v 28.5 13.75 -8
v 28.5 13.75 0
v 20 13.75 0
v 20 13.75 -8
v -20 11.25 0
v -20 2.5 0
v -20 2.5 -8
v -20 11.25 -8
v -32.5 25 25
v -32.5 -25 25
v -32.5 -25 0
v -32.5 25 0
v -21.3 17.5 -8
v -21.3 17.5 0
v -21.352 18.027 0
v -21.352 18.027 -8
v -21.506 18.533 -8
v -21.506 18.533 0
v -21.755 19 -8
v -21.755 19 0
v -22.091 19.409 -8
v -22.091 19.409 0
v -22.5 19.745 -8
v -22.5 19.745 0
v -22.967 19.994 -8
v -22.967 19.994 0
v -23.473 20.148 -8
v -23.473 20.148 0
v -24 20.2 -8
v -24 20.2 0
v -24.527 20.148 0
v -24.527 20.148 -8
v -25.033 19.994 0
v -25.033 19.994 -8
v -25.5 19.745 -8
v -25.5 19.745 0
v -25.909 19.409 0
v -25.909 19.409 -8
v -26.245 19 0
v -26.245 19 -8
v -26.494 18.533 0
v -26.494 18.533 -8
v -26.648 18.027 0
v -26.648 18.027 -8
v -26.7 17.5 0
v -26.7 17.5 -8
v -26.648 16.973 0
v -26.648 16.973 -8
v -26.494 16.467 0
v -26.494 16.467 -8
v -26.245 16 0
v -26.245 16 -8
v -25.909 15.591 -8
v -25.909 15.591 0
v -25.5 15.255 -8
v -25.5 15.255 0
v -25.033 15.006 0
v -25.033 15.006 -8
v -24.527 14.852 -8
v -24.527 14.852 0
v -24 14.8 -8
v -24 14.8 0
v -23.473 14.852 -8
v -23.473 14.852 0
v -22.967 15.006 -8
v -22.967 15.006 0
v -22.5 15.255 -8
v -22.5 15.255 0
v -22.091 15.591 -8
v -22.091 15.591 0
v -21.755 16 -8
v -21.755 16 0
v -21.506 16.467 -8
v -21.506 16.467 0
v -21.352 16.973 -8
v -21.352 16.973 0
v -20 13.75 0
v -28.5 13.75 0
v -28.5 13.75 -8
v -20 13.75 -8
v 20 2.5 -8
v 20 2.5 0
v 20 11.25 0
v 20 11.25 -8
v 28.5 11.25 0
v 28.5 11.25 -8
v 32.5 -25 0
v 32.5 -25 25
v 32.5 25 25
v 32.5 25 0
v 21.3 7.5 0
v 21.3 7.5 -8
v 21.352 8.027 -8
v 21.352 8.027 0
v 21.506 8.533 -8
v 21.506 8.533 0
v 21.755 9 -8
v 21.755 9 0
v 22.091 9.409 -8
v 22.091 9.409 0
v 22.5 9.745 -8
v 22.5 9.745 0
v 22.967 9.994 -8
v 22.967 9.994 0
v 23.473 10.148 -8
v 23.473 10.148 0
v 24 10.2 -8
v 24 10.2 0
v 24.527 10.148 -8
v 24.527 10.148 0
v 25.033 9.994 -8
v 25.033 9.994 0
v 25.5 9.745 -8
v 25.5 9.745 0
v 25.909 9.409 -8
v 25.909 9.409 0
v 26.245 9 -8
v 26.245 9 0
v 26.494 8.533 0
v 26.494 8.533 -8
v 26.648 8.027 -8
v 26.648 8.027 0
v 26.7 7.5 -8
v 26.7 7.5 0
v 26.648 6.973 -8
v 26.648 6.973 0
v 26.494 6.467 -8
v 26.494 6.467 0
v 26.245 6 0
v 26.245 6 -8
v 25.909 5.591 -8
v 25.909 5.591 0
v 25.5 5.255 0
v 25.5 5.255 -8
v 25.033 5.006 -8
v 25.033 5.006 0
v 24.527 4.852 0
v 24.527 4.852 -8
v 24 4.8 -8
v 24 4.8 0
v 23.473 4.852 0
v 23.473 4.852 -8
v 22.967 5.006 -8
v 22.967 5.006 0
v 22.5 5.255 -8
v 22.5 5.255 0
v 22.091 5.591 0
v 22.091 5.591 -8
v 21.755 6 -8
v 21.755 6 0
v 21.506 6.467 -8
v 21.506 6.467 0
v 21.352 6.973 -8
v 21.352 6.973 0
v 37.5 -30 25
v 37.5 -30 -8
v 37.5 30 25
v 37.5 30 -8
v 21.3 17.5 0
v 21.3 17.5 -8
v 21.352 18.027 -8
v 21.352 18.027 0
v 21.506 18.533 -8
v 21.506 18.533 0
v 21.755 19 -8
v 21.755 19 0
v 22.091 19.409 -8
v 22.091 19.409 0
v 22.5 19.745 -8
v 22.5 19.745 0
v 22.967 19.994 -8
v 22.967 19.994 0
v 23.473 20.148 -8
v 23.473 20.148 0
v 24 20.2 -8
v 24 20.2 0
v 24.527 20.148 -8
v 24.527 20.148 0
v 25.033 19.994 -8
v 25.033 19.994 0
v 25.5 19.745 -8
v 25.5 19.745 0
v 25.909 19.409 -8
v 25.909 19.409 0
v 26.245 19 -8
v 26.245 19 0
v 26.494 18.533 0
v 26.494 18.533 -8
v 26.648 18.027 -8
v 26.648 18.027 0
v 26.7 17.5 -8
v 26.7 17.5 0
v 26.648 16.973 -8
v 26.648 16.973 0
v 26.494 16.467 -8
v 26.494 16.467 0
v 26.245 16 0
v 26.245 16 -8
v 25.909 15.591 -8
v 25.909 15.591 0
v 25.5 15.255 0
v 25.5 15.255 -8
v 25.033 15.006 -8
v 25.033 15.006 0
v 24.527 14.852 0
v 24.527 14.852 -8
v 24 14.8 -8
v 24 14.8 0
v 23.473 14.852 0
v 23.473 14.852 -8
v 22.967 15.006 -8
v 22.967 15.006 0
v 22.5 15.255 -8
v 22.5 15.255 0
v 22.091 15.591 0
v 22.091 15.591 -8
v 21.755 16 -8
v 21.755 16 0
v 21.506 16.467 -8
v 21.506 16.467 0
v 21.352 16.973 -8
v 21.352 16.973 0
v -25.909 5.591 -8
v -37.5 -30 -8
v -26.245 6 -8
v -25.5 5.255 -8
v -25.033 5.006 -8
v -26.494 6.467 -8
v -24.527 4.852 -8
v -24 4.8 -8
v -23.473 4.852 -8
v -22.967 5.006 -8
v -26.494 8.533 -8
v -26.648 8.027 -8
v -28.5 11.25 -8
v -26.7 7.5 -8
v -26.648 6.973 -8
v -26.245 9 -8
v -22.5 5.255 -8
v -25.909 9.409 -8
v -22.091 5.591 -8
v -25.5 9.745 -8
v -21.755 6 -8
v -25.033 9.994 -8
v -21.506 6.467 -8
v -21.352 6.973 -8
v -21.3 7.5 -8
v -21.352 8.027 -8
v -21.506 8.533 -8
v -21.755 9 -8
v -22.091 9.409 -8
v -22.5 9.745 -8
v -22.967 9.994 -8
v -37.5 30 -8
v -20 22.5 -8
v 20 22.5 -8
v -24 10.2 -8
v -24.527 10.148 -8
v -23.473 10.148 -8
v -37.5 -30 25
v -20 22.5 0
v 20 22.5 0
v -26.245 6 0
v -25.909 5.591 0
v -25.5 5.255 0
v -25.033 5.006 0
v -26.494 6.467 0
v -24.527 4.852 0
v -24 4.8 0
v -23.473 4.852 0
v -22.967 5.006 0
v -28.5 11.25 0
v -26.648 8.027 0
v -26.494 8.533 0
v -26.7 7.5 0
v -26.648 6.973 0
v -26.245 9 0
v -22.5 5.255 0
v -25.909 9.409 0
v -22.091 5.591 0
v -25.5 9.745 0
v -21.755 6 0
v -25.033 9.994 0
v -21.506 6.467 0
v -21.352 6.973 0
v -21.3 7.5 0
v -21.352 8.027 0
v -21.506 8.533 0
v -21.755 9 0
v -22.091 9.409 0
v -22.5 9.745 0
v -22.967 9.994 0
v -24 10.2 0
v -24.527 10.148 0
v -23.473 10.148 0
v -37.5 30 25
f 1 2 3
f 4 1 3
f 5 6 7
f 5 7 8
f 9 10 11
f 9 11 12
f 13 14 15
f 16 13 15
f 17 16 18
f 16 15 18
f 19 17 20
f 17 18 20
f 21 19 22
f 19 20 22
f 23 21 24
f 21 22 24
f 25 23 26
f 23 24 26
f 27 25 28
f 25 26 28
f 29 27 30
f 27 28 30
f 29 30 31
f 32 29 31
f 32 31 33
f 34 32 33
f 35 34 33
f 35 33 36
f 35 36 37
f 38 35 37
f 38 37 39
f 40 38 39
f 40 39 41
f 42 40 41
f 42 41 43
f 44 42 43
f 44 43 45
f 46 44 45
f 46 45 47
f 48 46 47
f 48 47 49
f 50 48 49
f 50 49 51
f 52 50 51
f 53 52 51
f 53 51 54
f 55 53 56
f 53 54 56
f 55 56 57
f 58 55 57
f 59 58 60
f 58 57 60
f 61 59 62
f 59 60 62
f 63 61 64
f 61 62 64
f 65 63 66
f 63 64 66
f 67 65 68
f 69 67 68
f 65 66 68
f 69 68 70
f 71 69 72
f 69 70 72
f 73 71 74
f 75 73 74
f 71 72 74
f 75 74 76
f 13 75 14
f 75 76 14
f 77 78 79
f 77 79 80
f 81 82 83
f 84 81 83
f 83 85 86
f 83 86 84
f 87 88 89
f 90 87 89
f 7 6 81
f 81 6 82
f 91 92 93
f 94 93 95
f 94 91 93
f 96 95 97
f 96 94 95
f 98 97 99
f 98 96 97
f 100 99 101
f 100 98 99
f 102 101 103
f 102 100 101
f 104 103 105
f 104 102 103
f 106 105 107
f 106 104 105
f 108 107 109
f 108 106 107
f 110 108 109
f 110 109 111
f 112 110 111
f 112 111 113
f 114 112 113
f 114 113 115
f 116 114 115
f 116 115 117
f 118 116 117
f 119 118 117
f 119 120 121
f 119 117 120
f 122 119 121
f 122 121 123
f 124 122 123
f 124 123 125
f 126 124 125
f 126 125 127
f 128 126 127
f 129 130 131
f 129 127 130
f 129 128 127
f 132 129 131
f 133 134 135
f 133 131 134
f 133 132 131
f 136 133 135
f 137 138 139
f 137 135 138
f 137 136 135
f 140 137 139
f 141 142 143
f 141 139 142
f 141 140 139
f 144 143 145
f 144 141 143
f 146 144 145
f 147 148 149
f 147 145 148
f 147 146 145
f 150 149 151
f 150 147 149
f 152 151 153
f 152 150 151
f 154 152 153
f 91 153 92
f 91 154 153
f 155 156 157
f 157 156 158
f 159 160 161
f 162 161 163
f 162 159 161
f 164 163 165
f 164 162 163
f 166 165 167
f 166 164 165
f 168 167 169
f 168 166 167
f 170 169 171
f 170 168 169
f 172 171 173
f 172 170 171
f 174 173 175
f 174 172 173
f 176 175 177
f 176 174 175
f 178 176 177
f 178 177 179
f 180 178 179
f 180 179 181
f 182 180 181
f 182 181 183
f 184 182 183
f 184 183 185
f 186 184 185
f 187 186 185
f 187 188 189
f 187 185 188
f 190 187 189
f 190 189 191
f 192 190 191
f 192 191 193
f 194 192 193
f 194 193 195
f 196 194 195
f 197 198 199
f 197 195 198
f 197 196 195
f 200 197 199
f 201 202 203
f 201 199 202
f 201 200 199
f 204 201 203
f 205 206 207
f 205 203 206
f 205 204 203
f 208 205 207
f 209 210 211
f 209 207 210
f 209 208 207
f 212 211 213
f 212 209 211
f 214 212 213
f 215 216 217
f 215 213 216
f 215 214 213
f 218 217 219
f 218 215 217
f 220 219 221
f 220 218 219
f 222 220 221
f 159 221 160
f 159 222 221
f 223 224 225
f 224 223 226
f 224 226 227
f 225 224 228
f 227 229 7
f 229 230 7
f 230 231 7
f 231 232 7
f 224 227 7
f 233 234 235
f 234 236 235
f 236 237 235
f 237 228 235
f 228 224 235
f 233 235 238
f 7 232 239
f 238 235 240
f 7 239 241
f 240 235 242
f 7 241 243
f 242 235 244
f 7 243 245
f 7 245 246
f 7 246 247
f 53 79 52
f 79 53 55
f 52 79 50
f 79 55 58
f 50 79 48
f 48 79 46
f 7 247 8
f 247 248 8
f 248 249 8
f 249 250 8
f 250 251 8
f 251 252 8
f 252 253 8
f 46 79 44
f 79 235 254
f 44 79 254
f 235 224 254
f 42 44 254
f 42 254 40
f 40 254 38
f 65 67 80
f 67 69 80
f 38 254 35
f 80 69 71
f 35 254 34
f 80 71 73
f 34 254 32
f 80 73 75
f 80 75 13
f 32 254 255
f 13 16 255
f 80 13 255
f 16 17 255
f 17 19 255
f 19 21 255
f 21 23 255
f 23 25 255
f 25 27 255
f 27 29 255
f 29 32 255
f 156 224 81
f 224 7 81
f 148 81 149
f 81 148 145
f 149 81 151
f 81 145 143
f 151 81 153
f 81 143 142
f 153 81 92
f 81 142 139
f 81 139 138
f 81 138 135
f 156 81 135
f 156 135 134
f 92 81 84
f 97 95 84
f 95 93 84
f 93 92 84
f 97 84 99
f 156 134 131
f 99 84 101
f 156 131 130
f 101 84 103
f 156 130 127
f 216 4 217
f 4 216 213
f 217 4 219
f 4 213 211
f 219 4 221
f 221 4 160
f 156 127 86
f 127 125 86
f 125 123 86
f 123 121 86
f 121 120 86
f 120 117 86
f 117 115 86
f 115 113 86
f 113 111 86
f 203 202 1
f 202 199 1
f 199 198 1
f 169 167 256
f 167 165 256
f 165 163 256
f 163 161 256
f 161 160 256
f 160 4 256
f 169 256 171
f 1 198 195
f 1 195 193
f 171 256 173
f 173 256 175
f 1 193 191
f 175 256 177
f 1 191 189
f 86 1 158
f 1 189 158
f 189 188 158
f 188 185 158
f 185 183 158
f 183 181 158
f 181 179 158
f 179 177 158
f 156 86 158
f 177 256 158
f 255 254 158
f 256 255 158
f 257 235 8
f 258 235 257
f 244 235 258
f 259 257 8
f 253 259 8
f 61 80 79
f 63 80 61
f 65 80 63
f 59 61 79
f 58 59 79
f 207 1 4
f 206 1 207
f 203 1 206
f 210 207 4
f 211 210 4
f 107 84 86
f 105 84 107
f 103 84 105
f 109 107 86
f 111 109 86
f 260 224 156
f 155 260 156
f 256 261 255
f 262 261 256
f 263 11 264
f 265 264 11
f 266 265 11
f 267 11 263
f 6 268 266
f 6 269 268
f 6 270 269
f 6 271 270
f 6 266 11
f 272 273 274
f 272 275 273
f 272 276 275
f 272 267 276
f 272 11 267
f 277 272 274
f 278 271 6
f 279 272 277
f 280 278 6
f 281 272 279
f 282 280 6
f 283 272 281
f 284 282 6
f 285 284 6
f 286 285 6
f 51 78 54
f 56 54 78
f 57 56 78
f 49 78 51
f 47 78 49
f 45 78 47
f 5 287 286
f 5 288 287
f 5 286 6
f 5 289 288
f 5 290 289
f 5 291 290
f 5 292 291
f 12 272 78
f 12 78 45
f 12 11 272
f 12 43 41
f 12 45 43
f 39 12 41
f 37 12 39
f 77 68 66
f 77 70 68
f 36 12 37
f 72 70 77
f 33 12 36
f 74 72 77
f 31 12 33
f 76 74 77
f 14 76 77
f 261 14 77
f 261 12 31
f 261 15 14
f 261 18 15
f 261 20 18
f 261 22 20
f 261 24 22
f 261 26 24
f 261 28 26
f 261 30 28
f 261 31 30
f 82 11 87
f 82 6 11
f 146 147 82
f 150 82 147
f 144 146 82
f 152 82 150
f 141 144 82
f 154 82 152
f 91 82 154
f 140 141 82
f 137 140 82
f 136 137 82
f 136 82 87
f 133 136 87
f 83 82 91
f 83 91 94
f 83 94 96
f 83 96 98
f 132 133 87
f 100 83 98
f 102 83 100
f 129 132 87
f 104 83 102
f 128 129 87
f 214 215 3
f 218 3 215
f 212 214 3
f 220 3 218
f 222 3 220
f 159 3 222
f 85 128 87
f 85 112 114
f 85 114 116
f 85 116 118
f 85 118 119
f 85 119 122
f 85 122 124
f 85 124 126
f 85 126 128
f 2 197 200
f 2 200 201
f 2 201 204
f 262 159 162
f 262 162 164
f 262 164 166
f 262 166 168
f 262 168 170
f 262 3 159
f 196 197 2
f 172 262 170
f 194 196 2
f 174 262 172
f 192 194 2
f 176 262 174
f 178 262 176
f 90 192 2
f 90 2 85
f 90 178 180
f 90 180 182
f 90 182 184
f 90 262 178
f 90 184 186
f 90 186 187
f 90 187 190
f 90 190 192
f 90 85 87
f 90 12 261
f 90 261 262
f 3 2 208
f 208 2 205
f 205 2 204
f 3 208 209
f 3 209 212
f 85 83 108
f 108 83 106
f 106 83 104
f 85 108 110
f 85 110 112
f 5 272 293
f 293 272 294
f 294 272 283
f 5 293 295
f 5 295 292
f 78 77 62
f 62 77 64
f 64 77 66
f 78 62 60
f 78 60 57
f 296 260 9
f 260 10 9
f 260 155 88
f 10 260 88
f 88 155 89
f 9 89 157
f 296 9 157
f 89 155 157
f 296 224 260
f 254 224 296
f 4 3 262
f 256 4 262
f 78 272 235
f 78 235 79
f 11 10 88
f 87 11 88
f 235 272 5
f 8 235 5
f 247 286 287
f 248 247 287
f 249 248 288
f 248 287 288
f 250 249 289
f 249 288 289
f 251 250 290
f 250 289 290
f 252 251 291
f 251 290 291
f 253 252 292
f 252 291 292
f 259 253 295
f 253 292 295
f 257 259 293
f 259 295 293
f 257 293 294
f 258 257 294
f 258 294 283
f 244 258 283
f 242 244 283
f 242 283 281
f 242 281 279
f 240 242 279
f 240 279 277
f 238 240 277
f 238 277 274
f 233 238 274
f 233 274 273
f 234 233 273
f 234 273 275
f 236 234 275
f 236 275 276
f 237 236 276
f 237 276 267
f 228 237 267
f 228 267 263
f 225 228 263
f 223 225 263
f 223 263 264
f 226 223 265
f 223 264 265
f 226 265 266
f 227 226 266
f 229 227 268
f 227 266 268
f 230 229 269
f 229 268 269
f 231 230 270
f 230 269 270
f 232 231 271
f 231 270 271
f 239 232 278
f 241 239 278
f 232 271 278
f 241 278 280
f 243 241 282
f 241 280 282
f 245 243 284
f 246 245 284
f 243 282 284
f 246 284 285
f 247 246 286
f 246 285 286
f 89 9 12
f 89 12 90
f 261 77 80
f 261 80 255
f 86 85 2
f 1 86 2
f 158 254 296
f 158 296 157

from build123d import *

# Parameters (mm, degrees)
ESQUISSE1_W             = 75
ESQUISSE1_H             = 60
BOSS_EXTRU_1_DEPTH      = 8
ESQUISSE2_W             = 40
ESQUISSE2_H             = 20
ENL_V_MAT_EXTRU_1_DEPTH = 8
ESQUISSE3_W             = 8.5
ESQUISSE3_H             = 2.5
ENL_V_MAT_EXTRU_2_DEPTH = 8
ESQUISSE4_R             = 2.7
ENL_V_MAT_EXTRU_3_DEPTH = 49.685213361
ESQUISSE6_W             = 75
ESQUISSE6_H             = 60
BOSS_EXTRU_2_DEPTH      = 35
ESQUISSE7_W             = 65
ESQUISSE7_H             = 50
ENL_V_MAT_EXTRU_4_DEPTH = 35
CUT_EXTRUDE1_REACH      = 90.034
SKETCH1_W               = 10
SKETCH1_H               = 60


with BuildPart() as part:
    # Esquisse1 → Boss.-Extru.1 (new body)
    with BuildSketch(Plane.XY):
        Rectangle(ESQUISSE1_W, ESQUISSE1_H)
    extrude(amount=-BOSS_EXTRU_1_DEPTH)

    # Esquisse2 → Enlèv. mat.-Extru.1 (cut)
    with BuildSketch(Plane.XY):
        with Locations((0, 12.5)):
            Rectangle(ESQUISSE2_W, ESQUISSE2_H)
    extrude(amount=-ENL_V_MAT_EXTRU_1_DEPTH, mode=Mode.SUBTRACT)

    # Esquisse3 → Enlèv. mat.-Extru.2 (cut)
    with BuildSketch(Plane.XY):
        with Locations((-24.25, 12.5)):
            Rectangle(ESQUISSE3_W, ESQUISSE3_H)
    enl_v_mat_extru_2 = extrude(amount=-ENL_V_MAT_EXTRU_2_DEPTH, mode=Mode.SUBTRACT)

    # Esquisse4 → Enlèv. mat.-Extru.3 (cut, through all)
    with BuildSketch(Plane.XY):
        with Locations((-24, 17.5)):
            Circle(ESQUISSE4_R)
        with Locations((-24, 7.5)):
            Circle(ESQUISSE4_R)
    enl_v_mat_extru_3 = extrude(amount=-ENL_V_MAT_EXTRU_3_DEPTH, mode=Mode.SUBTRACT)

    # Symétrie2: Enlèv. mat.-Extru.2, Enlèv. mat.-Extru.3 across plane
    add(enl_v_mat_extru_2.mirror(Plane(origin=(0, 0, 0), x_dir=(0, 0, 1), z_dir=(1, 0, 0))), mode=Mode.SUBTRACT)
    add(enl_v_mat_extru_3.mirror(Plane(origin=(0, 0, 0), x_dir=(0, 0, 1), z_dir=(1, 0, 0))), mode=Mode.SUBTRACT)

    # Esquisse6 → Boss.-Extru.2 (add)
    with BuildSketch(Plane.XY):
        Rectangle(ESQUISSE6_W, ESQUISSE6_H)
    extrude(amount=BOSS_EXTRU_2_DEPTH)

    # Esquisse7 → Enlèv. mat.-Extru.4 (cut)
    with BuildSketch(Plane.XY.offset(35)):
        Rectangle(ESQUISSE7_W, ESQUISSE7_H)
    extrude(amount=-ENL_V_MAT_EXTRU_4_DEPTH, mode=Mode.SUBTRACT)

    # Cut-Extrude1: up to this face of the body (flat: up to its plane)
    cut_extrude1_end = Plane(part.part.faces().sort_by_distance((-37.5, 0, 13.5))[0])
    # Sketch1 → Cut-Extrude1 (cut, up to the picked face)
    with BuildSketch(Plane(origin=(37.5, 0, 0), x_dir=(0, 0, -1), z_dir=(1, 0, 0)), mode=Mode.PRIVATE) as cut_extrude1_sk1:
        with Locations((-30, 0)):
            Rectangle(SKETCH1_W, SKETCH1_H)
    cut_extrude1_tool1 = split(extrude(cut_extrude1_sk1.sketch, amount=-CUT_EXTRUDE1_REACH, mode=Mode.PRIVATE), bisect_by=cut_extrude1_end, keep=Keep.BOTH, mode=Mode.PRIVATE)
    add(cut_extrude1_tool1.solids().sort_by(Axis((37.5, 0, 30), (-1, 0, 0)))[0], mode=Mode.SUBTRACT)


solid = part.part
